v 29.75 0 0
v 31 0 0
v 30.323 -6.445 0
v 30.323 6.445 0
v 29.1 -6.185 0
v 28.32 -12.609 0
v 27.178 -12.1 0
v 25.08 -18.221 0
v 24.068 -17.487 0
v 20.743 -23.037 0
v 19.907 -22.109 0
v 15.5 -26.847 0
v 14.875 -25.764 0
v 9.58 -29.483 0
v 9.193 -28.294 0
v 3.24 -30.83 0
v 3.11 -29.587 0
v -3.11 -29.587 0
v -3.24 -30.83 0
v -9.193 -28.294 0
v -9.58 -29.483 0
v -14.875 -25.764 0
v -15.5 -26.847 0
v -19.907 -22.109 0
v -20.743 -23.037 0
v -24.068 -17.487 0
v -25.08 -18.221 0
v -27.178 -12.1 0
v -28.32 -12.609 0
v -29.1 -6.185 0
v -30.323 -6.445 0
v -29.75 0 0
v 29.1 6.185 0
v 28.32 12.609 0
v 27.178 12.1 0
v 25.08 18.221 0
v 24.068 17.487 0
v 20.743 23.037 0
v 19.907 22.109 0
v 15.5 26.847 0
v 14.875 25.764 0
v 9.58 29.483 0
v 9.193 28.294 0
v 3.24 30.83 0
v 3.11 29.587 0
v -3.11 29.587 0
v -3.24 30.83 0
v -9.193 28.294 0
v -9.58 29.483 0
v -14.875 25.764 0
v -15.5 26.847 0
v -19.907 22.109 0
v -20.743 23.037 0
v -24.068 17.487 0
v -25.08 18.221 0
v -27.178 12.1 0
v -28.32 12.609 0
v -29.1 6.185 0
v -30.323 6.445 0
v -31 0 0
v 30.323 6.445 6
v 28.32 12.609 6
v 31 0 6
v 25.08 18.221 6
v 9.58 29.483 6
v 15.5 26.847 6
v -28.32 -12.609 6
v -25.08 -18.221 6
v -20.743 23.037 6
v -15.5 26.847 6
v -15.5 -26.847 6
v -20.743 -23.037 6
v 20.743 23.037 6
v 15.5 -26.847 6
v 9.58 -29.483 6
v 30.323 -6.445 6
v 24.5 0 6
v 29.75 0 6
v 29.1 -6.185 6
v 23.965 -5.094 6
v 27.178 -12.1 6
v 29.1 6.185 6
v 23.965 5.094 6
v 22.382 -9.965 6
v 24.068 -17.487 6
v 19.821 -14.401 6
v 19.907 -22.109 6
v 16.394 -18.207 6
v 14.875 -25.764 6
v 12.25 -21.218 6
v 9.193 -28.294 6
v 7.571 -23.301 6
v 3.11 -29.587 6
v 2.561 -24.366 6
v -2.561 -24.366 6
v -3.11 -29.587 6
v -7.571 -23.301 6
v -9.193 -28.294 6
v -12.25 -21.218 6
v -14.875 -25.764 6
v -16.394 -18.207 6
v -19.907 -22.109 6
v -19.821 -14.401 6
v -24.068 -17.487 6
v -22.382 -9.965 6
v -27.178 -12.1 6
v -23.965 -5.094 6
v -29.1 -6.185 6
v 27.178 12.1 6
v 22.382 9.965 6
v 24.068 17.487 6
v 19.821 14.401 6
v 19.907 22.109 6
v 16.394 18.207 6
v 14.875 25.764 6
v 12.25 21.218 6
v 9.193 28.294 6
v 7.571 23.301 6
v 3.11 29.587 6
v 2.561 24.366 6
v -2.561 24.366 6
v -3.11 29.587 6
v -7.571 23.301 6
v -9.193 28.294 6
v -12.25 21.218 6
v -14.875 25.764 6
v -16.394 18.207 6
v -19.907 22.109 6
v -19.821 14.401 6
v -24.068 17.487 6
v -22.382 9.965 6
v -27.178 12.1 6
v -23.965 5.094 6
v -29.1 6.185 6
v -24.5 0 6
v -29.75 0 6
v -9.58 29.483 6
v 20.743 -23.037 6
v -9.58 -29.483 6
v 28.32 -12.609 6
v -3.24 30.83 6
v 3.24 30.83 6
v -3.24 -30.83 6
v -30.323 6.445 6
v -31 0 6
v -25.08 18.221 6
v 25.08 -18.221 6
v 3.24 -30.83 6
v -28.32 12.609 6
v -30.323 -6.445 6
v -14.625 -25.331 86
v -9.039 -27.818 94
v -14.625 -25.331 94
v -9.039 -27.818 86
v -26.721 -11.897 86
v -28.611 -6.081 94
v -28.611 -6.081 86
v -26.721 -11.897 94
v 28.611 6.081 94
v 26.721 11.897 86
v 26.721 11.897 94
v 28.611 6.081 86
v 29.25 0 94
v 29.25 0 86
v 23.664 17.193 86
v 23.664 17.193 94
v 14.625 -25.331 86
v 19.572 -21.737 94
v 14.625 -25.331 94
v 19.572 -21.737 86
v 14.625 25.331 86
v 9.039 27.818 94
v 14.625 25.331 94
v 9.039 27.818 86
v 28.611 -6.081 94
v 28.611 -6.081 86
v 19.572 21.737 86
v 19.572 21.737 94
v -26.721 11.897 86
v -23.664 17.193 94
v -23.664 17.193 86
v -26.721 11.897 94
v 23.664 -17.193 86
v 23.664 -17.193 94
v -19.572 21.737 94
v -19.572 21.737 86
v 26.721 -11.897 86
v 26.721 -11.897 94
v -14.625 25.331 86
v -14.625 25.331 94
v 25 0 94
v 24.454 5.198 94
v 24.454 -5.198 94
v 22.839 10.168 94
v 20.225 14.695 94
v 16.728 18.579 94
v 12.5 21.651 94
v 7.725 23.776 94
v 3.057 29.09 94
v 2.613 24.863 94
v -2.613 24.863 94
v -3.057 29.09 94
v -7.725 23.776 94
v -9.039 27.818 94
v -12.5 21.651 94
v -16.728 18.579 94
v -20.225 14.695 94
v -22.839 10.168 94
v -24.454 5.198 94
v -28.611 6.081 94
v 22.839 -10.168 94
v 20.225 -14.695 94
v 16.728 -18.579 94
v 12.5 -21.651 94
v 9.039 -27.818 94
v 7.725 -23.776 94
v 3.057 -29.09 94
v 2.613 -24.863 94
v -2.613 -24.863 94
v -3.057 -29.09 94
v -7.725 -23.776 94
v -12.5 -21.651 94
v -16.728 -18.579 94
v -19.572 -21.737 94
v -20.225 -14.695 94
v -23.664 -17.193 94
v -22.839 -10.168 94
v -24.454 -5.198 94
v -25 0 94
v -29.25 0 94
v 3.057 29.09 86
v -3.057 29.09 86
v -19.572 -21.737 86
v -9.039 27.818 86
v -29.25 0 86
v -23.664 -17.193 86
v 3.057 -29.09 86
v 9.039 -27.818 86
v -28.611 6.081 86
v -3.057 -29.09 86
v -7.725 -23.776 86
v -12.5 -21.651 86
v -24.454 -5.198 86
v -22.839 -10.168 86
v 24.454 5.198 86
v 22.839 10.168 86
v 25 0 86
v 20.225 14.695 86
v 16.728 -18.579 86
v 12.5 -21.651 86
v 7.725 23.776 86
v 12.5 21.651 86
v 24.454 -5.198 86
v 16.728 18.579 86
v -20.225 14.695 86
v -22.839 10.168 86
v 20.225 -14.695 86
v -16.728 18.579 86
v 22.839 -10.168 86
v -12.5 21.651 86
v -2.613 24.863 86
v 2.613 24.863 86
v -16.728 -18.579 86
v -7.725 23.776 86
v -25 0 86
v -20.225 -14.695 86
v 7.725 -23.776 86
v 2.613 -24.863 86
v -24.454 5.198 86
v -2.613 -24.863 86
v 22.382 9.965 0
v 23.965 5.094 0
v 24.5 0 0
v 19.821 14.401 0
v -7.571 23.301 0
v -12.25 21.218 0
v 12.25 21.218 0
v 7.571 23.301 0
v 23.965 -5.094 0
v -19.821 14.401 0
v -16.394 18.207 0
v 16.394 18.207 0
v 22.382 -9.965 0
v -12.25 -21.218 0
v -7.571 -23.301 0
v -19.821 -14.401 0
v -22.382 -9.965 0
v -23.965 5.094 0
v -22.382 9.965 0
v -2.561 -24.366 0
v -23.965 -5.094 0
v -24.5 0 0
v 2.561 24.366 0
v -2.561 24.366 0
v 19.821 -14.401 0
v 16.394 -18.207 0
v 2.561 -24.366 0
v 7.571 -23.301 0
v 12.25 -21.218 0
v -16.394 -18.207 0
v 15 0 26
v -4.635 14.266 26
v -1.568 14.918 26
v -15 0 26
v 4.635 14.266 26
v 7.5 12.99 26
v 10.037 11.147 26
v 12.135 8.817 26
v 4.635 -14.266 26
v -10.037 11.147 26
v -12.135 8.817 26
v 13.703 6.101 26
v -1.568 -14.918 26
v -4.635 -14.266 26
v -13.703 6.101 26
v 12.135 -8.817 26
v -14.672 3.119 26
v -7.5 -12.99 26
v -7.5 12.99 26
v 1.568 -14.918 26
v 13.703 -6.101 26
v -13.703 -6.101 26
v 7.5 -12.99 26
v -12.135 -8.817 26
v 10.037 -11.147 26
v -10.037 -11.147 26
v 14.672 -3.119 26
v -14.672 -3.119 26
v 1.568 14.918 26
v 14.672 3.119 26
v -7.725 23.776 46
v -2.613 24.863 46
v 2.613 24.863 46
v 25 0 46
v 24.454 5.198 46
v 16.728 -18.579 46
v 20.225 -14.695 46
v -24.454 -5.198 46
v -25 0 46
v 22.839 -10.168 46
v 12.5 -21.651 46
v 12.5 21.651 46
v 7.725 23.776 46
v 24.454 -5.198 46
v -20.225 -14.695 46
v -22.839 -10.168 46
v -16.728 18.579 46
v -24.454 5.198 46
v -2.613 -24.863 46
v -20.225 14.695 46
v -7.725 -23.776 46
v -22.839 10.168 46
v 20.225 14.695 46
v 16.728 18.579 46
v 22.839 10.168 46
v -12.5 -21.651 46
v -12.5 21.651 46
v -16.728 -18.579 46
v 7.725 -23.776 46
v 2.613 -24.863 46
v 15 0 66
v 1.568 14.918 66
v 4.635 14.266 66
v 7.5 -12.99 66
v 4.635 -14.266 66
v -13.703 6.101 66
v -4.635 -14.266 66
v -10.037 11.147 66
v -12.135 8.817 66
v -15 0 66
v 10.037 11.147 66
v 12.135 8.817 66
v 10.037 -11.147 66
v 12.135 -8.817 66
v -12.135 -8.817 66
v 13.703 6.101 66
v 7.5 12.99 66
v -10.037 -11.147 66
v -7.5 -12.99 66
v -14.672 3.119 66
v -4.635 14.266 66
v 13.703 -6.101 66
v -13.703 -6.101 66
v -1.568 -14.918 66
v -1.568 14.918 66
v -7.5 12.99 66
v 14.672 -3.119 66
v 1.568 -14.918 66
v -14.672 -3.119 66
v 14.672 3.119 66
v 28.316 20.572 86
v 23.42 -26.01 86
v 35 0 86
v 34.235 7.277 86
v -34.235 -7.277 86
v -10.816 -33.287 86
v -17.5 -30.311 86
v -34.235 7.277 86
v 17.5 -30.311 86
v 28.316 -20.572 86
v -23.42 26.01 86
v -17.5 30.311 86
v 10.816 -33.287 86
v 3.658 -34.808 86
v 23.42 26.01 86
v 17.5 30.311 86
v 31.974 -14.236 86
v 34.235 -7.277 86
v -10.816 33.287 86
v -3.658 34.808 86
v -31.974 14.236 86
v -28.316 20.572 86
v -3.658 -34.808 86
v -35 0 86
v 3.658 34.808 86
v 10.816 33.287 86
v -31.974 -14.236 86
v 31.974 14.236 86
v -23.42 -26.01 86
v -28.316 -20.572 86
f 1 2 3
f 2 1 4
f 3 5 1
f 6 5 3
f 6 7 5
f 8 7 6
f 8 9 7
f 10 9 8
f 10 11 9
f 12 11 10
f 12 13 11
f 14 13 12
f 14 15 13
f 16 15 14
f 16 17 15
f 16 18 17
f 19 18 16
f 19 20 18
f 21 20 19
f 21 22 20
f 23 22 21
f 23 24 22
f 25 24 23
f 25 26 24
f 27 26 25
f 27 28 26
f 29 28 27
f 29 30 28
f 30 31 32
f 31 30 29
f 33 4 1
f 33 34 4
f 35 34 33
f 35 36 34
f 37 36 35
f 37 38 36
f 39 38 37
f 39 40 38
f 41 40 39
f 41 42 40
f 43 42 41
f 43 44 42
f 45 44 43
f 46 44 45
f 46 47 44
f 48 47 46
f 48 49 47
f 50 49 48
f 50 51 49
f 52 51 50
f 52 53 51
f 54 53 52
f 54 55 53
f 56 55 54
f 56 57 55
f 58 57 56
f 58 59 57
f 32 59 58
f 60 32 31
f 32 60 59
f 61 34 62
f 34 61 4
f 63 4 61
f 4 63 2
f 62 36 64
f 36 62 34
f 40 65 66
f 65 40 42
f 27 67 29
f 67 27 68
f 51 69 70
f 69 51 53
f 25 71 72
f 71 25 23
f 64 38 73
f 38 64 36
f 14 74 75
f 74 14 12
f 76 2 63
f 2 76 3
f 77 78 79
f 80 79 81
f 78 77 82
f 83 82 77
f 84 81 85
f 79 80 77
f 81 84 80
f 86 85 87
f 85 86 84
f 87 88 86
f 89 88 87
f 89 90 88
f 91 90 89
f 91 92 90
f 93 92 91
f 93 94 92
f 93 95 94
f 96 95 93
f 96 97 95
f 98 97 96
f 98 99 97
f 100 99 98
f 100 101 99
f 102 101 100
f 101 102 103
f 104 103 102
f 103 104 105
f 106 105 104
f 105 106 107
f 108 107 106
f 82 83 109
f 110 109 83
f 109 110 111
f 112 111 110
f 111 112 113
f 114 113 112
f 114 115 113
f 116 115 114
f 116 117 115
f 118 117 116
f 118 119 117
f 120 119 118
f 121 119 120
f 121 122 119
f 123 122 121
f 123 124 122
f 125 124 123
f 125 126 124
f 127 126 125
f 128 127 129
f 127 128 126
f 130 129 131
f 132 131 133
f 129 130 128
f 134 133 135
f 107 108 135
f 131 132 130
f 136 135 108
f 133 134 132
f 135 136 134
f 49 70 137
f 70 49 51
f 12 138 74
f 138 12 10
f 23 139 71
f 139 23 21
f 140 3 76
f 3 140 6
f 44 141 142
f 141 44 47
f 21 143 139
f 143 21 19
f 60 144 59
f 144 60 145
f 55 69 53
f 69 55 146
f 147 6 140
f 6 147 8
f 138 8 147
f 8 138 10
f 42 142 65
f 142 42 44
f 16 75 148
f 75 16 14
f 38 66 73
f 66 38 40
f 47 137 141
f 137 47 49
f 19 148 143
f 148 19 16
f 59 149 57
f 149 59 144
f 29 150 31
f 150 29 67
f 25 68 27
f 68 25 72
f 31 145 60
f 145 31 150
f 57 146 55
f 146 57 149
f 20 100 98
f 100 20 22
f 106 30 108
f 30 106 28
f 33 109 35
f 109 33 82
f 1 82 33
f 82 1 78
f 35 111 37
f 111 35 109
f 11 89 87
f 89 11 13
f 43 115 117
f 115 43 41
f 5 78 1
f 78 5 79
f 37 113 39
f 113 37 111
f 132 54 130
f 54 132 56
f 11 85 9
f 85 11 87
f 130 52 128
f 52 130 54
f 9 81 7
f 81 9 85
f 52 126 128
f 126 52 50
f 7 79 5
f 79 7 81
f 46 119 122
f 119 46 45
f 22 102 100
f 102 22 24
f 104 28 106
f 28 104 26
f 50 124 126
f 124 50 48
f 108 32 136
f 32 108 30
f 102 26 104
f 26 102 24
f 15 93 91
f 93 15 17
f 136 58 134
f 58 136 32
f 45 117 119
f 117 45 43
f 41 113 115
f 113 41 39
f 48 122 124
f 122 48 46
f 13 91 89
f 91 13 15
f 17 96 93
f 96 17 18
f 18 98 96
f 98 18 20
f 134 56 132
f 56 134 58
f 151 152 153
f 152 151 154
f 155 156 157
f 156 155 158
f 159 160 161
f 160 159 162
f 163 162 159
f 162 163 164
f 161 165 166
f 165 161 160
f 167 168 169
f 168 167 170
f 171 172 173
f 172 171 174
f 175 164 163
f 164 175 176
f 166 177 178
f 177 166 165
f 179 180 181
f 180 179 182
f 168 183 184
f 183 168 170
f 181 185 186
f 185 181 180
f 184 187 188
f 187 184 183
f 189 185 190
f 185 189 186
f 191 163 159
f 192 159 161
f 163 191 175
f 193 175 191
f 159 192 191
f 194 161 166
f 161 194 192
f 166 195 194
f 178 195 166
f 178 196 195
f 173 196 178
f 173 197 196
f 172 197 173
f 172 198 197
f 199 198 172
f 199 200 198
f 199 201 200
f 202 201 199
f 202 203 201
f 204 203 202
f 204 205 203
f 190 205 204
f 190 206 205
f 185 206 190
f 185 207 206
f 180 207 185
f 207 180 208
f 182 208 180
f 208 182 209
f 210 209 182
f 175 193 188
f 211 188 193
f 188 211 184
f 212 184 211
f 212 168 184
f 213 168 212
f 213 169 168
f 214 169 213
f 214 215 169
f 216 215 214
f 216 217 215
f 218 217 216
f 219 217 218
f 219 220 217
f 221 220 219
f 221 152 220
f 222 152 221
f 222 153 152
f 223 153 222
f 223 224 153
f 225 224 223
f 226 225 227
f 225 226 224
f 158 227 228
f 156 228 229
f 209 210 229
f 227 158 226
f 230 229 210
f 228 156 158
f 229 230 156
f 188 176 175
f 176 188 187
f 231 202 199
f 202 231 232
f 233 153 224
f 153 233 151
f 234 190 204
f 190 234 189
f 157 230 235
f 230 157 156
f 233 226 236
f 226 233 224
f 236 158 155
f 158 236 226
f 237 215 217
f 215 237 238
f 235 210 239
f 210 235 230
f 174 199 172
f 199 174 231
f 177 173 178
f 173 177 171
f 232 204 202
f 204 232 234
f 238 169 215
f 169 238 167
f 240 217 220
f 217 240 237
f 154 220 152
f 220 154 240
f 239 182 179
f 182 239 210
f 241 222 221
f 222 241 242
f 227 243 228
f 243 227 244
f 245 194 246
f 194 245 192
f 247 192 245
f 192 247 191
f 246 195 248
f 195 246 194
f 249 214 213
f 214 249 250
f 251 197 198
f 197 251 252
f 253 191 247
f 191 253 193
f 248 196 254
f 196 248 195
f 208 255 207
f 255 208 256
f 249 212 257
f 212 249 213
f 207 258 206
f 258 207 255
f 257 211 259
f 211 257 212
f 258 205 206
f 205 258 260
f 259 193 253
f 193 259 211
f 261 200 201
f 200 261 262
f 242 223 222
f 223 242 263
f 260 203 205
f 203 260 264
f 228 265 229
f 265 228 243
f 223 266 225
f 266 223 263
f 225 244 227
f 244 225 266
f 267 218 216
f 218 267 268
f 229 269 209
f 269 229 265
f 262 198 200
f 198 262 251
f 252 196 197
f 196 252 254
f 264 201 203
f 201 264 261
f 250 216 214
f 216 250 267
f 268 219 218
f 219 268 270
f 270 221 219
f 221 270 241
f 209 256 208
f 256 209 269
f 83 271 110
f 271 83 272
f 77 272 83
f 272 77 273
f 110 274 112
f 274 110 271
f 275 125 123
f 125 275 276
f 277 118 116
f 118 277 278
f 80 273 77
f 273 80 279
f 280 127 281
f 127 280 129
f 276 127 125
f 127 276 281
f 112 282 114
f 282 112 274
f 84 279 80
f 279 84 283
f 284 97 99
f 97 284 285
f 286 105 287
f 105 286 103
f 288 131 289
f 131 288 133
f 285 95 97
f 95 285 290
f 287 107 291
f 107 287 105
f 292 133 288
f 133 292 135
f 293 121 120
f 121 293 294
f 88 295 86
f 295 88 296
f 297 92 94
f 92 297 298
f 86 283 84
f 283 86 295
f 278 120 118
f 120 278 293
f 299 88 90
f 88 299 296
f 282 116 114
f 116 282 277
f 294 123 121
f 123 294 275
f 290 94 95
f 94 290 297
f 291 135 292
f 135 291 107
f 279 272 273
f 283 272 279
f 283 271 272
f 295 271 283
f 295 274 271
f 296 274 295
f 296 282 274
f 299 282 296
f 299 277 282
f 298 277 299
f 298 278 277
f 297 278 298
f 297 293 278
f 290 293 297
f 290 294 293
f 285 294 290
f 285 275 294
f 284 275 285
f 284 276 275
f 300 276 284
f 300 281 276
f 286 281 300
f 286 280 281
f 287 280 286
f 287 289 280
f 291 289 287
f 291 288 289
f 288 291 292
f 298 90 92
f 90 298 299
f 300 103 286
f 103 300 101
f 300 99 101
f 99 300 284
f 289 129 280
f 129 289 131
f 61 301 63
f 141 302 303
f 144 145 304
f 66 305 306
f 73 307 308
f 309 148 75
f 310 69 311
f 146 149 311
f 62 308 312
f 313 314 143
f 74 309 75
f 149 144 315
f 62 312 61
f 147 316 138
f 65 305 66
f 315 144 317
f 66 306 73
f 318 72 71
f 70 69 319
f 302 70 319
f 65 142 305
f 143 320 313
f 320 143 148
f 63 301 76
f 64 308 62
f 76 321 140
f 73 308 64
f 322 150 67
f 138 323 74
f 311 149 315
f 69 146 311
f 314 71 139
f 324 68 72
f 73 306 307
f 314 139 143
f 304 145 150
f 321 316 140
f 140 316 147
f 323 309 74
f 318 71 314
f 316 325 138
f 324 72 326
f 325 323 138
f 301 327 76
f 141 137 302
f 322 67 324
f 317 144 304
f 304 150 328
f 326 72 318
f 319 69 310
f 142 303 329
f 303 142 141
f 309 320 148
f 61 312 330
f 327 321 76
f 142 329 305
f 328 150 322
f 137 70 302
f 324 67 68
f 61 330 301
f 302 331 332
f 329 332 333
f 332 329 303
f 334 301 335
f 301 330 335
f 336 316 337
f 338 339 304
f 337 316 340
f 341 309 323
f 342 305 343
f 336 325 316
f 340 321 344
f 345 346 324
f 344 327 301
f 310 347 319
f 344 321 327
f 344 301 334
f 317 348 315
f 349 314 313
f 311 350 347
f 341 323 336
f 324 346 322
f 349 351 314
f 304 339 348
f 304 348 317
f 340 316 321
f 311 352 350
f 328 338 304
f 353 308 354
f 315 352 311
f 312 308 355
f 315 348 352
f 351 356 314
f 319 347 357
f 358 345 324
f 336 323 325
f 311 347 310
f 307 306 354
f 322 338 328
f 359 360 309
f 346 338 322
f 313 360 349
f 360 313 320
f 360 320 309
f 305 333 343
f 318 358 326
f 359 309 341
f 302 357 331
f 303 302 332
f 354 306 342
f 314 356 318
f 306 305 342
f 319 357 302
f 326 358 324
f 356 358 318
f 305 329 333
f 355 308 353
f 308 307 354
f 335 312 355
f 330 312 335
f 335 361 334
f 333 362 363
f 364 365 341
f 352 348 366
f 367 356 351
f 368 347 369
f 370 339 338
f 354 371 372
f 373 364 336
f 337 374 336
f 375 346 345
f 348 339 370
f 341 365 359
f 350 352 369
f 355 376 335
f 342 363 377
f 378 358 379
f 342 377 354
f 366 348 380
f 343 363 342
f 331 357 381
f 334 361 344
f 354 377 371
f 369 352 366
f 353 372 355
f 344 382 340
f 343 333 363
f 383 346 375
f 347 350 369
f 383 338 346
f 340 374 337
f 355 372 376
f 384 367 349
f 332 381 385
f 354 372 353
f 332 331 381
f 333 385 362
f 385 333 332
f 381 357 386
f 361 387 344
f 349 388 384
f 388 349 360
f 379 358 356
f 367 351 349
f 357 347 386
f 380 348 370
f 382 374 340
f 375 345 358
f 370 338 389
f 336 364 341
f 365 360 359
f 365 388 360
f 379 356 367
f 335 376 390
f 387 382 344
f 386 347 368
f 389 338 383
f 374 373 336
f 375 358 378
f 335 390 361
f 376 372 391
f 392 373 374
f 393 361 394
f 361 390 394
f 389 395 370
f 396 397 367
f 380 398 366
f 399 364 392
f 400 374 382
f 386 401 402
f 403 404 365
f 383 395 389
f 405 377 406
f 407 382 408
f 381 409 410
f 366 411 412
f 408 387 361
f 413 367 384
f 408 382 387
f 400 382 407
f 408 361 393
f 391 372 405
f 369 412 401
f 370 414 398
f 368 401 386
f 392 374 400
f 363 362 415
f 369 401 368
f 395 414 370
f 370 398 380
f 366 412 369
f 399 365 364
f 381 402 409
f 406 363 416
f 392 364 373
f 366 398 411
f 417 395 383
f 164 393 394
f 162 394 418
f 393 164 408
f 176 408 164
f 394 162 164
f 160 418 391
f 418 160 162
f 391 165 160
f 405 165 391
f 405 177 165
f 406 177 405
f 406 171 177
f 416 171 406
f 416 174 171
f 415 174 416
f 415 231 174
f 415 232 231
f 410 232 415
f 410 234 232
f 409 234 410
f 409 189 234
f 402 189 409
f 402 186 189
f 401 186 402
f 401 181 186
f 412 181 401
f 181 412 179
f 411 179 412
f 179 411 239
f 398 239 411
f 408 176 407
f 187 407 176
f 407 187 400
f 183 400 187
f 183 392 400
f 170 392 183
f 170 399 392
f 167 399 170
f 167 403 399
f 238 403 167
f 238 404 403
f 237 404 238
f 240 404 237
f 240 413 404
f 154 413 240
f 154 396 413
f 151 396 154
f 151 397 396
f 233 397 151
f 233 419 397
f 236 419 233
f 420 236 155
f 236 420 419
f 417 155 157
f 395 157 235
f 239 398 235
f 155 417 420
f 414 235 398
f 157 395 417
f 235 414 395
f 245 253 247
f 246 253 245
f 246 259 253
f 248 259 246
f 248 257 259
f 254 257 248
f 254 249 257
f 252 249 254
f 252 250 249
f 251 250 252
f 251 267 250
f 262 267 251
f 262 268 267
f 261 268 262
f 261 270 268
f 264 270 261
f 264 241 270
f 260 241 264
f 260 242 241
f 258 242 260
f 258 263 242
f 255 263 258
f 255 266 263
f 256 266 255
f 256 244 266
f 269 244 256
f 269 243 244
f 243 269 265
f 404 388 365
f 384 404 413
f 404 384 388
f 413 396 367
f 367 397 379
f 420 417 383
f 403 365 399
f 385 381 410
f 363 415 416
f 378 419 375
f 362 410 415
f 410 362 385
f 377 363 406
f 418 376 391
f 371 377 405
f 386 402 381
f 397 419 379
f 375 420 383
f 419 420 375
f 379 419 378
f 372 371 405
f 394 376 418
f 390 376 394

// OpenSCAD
scale([.5, .5, 1]) {

difference() {
    translate([0, 0, 0]) {
        cylinder(6, 62, 62);
    } 
    translate([0, 0, -1]) { 
        cylinder(25, 59.5, 59.5);
    }
}
    translate([0, 0, 0]) { 
       cylinder(12, 49, 49);
    }
    translate([0, 0, 6]) { 
       cylinder(20, 62, 30);
    }
    translate([0, 0, 26]) { 
       cylinder(20, 30, 50);
    }
    translate([0, 0, 46]) { 
       cylinder(20, 50, 30);
    }
    translate([0, 0, 66]) { 
       cylinder(20, 30, 70);
    }
    difference() {
        translate([0, 0, 82]) { 
           cylinder(12, 58.5, 58.5);
        }
        translate([0, 0, 82]) { 
           cylinder(15, 50, 50);
        }
    }
}
